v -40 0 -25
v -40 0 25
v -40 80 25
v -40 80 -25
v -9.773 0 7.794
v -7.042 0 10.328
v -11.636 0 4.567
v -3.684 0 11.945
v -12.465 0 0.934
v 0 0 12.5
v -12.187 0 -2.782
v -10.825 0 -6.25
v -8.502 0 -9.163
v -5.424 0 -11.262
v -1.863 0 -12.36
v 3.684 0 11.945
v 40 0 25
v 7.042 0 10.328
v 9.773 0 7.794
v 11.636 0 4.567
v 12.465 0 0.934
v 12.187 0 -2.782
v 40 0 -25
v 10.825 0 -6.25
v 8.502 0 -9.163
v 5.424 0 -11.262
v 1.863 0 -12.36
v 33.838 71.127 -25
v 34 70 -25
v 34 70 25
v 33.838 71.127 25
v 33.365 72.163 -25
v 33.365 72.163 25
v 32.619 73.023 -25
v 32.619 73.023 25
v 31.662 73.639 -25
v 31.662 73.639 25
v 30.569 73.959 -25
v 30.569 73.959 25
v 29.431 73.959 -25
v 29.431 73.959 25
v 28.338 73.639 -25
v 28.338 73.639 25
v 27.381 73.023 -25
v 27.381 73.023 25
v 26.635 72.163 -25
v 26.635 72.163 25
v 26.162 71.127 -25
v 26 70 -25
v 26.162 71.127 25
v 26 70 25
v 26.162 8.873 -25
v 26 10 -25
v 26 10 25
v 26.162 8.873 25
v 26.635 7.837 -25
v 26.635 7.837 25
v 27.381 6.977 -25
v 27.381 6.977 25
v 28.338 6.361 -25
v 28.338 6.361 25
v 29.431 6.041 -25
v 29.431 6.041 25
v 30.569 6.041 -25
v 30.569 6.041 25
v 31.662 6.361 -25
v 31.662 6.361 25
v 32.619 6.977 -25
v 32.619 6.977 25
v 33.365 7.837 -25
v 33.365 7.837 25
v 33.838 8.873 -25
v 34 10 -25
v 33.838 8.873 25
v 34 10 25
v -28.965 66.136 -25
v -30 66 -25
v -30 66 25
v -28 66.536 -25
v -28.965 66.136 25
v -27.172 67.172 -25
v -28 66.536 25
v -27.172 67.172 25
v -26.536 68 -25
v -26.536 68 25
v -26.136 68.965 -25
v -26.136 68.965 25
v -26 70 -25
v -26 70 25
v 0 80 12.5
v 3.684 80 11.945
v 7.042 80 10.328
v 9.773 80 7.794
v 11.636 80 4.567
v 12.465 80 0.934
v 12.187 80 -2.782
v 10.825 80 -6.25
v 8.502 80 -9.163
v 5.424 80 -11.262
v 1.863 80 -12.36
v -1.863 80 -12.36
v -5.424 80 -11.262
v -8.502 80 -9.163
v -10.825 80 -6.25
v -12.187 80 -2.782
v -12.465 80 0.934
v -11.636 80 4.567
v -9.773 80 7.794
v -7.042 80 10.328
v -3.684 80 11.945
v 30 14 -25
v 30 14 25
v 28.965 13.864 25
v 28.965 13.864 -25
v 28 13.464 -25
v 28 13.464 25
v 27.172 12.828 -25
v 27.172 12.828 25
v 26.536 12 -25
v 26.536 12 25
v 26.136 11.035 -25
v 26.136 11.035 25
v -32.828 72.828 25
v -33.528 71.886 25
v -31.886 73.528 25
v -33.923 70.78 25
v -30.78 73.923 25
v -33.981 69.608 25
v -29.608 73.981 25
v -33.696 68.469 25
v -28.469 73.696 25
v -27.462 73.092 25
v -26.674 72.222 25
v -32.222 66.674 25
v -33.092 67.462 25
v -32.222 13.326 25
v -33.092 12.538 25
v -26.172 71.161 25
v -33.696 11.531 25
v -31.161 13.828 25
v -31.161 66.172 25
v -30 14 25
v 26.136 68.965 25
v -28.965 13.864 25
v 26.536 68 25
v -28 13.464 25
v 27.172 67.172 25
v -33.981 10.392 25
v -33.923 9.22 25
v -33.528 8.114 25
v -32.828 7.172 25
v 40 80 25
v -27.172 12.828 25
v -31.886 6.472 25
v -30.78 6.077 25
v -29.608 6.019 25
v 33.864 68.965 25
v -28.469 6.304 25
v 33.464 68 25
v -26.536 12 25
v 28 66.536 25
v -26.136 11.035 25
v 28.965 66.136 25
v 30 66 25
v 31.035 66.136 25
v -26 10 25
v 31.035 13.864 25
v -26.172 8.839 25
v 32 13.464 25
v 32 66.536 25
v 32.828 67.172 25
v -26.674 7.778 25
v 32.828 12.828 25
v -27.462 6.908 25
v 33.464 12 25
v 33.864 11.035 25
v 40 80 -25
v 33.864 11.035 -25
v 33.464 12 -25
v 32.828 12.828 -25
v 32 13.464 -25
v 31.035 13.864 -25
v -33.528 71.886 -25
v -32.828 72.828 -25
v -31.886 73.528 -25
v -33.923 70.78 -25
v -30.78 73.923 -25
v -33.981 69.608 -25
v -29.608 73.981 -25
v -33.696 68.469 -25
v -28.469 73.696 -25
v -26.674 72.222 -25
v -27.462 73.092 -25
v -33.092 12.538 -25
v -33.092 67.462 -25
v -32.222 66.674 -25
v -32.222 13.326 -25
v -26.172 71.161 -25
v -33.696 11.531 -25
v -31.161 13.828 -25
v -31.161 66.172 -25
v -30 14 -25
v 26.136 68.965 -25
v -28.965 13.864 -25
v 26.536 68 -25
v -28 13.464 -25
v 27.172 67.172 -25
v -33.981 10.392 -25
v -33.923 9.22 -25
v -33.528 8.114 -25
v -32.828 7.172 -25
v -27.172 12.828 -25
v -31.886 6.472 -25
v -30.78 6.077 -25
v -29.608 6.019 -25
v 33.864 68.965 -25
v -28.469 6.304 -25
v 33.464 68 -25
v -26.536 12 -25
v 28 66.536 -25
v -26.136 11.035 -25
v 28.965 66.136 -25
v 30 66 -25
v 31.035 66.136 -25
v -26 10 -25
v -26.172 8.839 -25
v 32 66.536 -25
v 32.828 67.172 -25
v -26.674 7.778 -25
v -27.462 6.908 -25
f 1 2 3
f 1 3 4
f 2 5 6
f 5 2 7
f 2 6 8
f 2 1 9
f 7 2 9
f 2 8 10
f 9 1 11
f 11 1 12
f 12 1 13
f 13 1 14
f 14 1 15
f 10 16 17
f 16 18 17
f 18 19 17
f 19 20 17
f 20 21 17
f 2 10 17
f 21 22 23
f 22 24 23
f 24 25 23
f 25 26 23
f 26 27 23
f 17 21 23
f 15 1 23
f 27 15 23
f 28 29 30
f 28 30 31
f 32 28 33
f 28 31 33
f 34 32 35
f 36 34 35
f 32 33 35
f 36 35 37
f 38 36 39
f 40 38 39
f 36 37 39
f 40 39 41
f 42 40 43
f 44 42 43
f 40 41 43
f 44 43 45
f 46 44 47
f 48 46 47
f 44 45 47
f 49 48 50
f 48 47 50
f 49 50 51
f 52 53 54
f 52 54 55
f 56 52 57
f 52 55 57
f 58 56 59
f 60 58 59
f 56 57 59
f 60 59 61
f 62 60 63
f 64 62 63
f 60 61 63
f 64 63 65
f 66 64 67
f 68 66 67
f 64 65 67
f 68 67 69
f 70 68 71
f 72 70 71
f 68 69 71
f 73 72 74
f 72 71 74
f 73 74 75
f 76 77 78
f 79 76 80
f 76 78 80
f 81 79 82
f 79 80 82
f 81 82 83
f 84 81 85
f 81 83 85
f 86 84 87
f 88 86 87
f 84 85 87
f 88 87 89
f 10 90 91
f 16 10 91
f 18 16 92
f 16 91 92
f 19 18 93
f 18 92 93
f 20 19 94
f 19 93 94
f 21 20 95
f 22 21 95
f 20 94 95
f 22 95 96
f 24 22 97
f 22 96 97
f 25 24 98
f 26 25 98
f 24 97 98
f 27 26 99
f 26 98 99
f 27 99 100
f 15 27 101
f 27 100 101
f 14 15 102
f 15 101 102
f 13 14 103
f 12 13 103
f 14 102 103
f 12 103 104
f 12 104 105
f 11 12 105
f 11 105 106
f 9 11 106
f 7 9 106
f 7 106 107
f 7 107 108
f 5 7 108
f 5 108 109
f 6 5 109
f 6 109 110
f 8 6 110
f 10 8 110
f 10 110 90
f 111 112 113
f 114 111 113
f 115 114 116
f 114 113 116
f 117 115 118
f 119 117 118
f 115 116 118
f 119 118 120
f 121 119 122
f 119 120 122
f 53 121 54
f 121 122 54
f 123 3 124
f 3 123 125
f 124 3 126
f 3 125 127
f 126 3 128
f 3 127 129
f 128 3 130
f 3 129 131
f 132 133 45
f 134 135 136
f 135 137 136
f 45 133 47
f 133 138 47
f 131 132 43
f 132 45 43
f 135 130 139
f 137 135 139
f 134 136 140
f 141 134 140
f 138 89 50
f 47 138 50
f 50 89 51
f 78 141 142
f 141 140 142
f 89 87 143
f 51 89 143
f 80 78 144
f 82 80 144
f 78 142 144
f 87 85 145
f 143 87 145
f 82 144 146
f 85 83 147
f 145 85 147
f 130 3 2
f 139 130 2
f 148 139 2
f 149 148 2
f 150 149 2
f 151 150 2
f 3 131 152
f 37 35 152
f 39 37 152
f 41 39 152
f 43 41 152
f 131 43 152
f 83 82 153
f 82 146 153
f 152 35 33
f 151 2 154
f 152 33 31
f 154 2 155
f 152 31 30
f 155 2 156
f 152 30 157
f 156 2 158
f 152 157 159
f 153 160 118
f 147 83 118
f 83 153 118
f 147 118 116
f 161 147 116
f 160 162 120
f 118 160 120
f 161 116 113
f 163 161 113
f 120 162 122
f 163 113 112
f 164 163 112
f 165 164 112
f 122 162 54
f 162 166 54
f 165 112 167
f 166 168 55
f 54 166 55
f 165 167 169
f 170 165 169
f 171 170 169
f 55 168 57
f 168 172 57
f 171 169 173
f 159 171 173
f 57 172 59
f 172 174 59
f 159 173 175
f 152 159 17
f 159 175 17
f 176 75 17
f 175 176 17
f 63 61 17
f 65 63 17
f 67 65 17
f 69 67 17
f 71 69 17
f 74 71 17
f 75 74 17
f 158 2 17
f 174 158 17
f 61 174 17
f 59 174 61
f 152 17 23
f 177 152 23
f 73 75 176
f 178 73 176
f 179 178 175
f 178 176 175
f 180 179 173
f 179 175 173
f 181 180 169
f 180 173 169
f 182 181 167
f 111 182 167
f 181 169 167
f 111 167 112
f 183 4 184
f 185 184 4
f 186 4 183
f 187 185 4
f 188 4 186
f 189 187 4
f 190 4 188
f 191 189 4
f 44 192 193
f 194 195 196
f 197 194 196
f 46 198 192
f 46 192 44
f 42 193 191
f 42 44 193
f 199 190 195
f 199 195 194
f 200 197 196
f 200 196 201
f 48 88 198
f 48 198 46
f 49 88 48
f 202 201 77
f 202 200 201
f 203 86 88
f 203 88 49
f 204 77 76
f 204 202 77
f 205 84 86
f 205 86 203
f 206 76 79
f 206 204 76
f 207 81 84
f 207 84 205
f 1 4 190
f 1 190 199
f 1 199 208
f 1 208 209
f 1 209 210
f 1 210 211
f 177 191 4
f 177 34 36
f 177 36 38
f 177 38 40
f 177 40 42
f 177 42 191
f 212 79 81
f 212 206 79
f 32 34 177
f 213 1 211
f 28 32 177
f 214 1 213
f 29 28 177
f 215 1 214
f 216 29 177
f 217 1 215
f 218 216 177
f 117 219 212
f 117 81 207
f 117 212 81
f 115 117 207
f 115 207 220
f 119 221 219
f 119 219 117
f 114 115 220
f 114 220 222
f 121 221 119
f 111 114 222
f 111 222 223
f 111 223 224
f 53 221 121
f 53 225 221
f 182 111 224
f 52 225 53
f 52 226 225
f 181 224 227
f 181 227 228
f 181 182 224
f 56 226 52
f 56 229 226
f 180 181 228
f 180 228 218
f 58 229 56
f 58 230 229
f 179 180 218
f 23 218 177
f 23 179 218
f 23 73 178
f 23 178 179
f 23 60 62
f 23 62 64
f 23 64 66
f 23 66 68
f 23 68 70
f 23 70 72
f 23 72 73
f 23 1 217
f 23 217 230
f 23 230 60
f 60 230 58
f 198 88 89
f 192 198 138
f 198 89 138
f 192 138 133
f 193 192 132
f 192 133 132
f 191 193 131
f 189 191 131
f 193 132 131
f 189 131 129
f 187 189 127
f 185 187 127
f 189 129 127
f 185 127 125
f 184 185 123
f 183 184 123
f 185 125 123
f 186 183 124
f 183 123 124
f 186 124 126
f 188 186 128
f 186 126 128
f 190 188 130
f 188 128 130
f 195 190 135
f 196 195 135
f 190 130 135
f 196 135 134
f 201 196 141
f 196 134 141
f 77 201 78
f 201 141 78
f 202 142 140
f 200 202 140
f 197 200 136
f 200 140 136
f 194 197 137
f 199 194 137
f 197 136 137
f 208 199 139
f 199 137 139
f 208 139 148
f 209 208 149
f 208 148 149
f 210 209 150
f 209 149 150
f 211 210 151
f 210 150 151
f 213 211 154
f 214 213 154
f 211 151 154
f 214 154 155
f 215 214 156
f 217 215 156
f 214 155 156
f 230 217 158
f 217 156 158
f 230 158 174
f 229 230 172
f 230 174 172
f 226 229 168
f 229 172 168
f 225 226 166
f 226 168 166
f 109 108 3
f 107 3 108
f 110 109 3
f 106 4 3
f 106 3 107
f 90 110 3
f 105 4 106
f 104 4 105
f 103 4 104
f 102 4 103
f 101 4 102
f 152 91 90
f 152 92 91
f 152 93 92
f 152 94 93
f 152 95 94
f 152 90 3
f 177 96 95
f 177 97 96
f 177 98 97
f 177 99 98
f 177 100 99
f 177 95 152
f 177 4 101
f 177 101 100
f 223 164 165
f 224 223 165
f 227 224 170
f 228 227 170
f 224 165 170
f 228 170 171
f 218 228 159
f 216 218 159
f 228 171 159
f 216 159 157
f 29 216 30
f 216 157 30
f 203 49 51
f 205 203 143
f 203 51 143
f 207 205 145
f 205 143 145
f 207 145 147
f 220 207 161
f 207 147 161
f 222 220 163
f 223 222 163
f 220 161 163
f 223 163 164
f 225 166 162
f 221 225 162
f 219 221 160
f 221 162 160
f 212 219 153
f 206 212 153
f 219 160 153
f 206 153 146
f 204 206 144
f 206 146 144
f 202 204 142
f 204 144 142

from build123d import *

# Parameters (mm, degrees)
SKETCH1_W           = 80
SKETCH1_H           = 50
BOSS_EXTRUDE1_DEPTH = 80
SKETCH2_R           = 12.5
CUT_EXTRUDE1_DEPTH  = 93.870878105
CUT_EXTRUDE2_DEPTH  = 103.46950766


with BuildPart() as part:
    # Sketch1 → Boss-Extrude1 (new body)
    with BuildSketch(Plane(origin=(0, 0, 0), x_dir=(1, 0, 0), z_dir=(0, 1, 0))):
        Rectangle(SKETCH1_W, SKETCH1_H)
    extrude(amount=BOSS_EXTRUDE1_DEPTH)

    # Sketch2 → Cut-Extrude1 (cut, through all)
    with BuildSketch(Plane(origin=(0, 80, 0), x_dir=(1, 0, 0), z_dir=(0, 1, 0))):
        with Locations(Location((0, 0, 0), (0, 0, 270))):
            Circle(SKETCH2_R)
    extrude(amount=-CUT_EXTRUDE1_DEPTH, mode=Mode.SUBTRACT)

    # Sketch3 → Cut-Extrude2 (cut, through all)
    with BuildSketch(Plane.XY.offset(25)):
        with BuildLine():
            ThreePointArc((-26, 70), (-32.828427125, 72.828427125), (-30, 66))
            Line((-30, 66), (-30, 70))
            Line((-30, 70), (-26, 70))
        make_face()
        with BuildLine():
            Line((-30, 70), (-30, 66))
            ThreePointArc((-30, 66), (-27.171572875, 67.171572875), (-26, 70))
            Line((-26, 70), (-30, 70))
        make_face()
        with BuildLine():
            ThreePointArc((-30, 14), (-32.828427125, 7.171572875), (-26, 10))
            Line((-26, 10), (-30, 10))
            Line((-30, 10), (-30, 14))
        make_face()
        with BuildLine():
            Line((-30, 10), (-26, 10))
            ThreePointArc((-26, 10), (-27.171572875, 12.828427125), (-30, 14))
            Line((-30, 14), (-30, 10))
        make_face()
        with BuildLine():
            ThreePointArc((30, 14), (27.171572875, 12.828427125), (26, 10))
            Line((26, 10), (30, 10))
            Line((30, 10), (30, 14))
        make_face()
        with BuildLine():
            Line((30, 10), (26, 10))
            ThreePointArc((26, 10), (30, 6), (34, 10))
            ThreePointArc((34, 10), (32.828427125, 12.828427125), (30, 14))
            Line((30, 14), (30, 10))
        make_face()
        with BuildLine():
            ThreePointArc((26, 70), (27.171572875, 67.171572875), (30, 66))
            Line((30, 66), (30, 70))
            Line((30, 70), (26, 70))
        make_face()
        with BuildLine():
            Line((30, 70), (30, 66))
            ThreePointArc((30, 66), (32.828427125, 67.171572875), (34, 70))
            ThreePointArc((34, 70), (30, 74), (26, 70))
            Line((26, 70), (30, 70))
        make_face()
    extrude(amount=-CUT_EXTRUDE2_DEPTH, mode=Mode.SUBTRACT)


solid = part.part
